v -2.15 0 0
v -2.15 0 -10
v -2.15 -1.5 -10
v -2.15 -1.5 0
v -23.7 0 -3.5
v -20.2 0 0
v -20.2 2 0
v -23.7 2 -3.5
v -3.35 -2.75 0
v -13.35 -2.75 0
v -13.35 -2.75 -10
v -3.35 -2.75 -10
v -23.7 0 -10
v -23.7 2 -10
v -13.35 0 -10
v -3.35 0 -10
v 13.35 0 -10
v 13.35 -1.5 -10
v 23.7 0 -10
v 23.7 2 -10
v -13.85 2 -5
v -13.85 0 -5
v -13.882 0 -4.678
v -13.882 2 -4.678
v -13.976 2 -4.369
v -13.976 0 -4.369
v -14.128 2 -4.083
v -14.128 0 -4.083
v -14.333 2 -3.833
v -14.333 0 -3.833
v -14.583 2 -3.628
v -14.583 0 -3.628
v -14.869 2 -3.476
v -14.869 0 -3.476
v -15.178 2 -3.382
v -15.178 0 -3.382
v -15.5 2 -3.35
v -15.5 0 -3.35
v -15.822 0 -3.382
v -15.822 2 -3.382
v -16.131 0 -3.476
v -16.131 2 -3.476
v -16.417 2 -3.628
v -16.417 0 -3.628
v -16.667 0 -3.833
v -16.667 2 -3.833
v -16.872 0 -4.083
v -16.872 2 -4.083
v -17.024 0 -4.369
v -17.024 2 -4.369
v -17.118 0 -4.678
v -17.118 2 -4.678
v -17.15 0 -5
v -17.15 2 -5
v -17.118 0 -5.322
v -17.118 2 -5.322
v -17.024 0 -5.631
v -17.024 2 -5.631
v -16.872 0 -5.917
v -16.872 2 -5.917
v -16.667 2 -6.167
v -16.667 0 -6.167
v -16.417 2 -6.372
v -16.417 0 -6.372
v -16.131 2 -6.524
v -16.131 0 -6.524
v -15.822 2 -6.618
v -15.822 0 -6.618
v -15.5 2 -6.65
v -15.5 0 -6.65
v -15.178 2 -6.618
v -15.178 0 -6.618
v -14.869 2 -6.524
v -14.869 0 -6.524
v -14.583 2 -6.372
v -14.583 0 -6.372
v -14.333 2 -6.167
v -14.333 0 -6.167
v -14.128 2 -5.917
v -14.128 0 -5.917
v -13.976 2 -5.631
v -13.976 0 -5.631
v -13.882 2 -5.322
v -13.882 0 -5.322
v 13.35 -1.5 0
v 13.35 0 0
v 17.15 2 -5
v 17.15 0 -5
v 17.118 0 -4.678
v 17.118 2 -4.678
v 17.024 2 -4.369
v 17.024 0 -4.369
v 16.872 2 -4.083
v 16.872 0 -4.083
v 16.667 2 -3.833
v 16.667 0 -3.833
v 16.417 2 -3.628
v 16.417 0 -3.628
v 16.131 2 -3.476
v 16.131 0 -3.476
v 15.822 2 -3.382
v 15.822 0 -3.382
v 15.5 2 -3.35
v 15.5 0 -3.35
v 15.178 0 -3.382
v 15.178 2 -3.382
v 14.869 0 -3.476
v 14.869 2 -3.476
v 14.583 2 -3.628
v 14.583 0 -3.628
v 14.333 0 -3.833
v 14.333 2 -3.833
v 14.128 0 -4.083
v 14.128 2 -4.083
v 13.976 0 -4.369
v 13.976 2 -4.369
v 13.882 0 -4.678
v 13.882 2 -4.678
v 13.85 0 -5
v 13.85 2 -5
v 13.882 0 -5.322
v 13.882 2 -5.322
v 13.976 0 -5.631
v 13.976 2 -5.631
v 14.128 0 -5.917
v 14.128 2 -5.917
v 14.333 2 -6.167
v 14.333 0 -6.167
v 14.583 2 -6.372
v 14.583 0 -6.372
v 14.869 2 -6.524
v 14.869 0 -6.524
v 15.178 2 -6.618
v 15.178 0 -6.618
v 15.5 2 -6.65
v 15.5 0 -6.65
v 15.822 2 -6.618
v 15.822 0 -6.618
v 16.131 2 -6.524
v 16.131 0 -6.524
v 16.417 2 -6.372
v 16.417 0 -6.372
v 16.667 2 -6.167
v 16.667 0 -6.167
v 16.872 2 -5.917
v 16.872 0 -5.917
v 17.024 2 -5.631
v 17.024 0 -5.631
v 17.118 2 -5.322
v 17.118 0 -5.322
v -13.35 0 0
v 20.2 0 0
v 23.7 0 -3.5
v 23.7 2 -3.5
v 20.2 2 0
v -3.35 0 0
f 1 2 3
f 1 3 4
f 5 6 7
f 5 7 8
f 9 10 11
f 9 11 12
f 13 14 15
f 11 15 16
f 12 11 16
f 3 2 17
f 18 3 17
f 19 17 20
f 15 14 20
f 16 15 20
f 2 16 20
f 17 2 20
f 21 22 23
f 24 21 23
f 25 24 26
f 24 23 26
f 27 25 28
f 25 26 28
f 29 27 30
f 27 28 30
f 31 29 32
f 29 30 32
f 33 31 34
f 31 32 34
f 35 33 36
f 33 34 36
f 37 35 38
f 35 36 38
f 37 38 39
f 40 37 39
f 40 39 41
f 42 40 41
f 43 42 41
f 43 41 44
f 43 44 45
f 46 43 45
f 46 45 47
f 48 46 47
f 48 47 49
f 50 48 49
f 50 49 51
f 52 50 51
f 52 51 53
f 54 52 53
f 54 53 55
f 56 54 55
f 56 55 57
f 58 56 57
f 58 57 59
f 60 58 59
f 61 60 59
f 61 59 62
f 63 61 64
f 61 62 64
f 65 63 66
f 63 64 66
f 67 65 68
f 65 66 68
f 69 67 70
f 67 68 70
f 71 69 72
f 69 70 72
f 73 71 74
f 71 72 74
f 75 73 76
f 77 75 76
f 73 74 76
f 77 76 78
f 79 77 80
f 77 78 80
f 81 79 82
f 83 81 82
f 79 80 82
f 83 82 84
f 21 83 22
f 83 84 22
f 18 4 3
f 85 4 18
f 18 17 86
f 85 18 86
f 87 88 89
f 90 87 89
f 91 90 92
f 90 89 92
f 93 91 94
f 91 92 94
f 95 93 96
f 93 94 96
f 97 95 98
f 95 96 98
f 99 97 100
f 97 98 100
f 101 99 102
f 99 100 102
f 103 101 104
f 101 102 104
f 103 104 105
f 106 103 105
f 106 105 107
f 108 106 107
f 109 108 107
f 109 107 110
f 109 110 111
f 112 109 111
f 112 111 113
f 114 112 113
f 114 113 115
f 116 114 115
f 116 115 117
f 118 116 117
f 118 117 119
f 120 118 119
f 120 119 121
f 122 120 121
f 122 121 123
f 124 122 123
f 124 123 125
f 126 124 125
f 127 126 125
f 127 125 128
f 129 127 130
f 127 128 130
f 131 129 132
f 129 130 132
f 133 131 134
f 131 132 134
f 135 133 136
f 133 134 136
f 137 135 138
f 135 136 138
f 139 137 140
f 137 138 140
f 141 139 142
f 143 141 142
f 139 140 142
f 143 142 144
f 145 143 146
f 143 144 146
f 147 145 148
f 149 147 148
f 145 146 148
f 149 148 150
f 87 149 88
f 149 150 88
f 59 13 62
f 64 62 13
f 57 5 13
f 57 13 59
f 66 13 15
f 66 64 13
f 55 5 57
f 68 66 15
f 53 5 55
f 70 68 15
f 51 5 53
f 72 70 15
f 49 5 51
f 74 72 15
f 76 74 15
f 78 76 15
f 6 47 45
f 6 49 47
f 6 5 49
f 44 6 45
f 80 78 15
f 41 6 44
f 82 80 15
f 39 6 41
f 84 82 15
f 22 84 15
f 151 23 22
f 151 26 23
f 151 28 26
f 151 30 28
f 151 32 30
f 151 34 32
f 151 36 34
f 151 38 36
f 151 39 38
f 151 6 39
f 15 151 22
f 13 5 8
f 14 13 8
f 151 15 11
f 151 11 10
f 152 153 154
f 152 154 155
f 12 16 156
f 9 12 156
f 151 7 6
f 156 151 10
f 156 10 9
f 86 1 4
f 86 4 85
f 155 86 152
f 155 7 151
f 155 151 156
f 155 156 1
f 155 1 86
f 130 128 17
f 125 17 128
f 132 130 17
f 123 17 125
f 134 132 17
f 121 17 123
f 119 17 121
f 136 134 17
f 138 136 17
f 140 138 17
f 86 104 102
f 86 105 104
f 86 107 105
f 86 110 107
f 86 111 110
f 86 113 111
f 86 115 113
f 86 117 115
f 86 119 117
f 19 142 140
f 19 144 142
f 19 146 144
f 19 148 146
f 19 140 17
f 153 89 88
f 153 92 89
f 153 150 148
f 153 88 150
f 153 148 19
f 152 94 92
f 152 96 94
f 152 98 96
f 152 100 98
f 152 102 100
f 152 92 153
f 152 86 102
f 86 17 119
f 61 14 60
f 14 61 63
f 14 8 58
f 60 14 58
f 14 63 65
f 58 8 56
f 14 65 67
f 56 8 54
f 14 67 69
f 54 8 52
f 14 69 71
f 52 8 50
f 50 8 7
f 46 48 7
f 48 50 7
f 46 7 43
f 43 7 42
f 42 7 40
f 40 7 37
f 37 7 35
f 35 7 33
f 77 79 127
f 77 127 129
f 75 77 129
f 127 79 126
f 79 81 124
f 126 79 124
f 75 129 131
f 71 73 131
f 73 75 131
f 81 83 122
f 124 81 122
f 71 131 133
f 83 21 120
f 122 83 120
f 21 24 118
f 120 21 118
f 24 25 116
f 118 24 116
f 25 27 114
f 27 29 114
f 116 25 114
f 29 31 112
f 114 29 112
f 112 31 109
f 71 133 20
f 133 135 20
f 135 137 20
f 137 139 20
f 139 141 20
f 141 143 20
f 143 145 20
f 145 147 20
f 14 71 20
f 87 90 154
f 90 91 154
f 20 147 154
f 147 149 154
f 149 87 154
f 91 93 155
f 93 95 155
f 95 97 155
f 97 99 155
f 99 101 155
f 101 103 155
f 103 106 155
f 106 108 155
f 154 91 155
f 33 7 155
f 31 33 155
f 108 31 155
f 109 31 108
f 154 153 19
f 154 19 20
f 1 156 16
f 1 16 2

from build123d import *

# Parameters (mm, degrees)
SKETCH_W             = 47.4
SKETCH_H             = 2
PAD_DEPTH            = 10
SKETCH002_W          = 15.5
SKETCH002_H          = 10
PAD001_DEPTH         = 1.5
SKETCH003_R          = 1.65
POCKET_DEPTH         = 2.001
POCKET_DEPTH_BACK    = 1.501
POCKET001_DEPTH      = 2.001
POCKET001_DEPTH_BACK = 1.501
SKETCH005_W          = 10
SKETCH005_H          = 10
PAD002_DEPTH         = 2.75


with BuildPart() as part:
    # Sketch → Pad (new body)
    with BuildSketch(Plane.XY):
        with Locations((0, 1)):
            Rectangle(SKETCH_W, SKETCH_H)
    extrude(amount=-PAD_DEPTH)

    # Sketch002 → Pad001 (join)
    with BuildSketch(Plane.XZ):
        with Locations((5.6, -5)):
            Rectangle(SKETCH002_W, SKETCH002_H)
    extrude(amount=PAD001_DEPTH)

    # Sketch003 → Pocket (cut, two sides)
    with BuildSketch(Plane.XZ) as pocket_sk:
        with Locations((-15.5, -5)):
            Circle(SKETCH003_R)
        with Locations((15.5, -5)):
            Circle(SKETCH003_R)
    extrude(amount=-POCKET_DEPTH, mode=Mode.SUBTRACT)
    extrude(pocket_sk.sketch, amount=POCKET_DEPTH_BACK, mode=Mode.SUBTRACT)

    # Sketch004 → Pocket001 (cut, two sides)
    with BuildSketch(Plane.XZ) as pocket001_sk:
        Polygon((-20.2, 0), (-23.7, -3.5), (-23.7, 0), align=None)
        Polygon((20.2, 0), (23.7, 0), (23.7, -3.5), align=None)
    extrude(amount=-POCKET001_DEPTH, mode=Mode.SUBTRACT)
    extrude(pocket001_sk.sketch, amount=POCKET001_DEPTH_BACK, mode=Mode.SUBTRACT)

    # Sketch005 → Pad002 (join)
    with BuildSketch(Plane.XZ):
        with Locations((-8.35, -5)):
            Rectangle(SKETCH005_W, SKETCH005_H)
    extrude(amount=PAD002_DEPTH)


solid = part.part
